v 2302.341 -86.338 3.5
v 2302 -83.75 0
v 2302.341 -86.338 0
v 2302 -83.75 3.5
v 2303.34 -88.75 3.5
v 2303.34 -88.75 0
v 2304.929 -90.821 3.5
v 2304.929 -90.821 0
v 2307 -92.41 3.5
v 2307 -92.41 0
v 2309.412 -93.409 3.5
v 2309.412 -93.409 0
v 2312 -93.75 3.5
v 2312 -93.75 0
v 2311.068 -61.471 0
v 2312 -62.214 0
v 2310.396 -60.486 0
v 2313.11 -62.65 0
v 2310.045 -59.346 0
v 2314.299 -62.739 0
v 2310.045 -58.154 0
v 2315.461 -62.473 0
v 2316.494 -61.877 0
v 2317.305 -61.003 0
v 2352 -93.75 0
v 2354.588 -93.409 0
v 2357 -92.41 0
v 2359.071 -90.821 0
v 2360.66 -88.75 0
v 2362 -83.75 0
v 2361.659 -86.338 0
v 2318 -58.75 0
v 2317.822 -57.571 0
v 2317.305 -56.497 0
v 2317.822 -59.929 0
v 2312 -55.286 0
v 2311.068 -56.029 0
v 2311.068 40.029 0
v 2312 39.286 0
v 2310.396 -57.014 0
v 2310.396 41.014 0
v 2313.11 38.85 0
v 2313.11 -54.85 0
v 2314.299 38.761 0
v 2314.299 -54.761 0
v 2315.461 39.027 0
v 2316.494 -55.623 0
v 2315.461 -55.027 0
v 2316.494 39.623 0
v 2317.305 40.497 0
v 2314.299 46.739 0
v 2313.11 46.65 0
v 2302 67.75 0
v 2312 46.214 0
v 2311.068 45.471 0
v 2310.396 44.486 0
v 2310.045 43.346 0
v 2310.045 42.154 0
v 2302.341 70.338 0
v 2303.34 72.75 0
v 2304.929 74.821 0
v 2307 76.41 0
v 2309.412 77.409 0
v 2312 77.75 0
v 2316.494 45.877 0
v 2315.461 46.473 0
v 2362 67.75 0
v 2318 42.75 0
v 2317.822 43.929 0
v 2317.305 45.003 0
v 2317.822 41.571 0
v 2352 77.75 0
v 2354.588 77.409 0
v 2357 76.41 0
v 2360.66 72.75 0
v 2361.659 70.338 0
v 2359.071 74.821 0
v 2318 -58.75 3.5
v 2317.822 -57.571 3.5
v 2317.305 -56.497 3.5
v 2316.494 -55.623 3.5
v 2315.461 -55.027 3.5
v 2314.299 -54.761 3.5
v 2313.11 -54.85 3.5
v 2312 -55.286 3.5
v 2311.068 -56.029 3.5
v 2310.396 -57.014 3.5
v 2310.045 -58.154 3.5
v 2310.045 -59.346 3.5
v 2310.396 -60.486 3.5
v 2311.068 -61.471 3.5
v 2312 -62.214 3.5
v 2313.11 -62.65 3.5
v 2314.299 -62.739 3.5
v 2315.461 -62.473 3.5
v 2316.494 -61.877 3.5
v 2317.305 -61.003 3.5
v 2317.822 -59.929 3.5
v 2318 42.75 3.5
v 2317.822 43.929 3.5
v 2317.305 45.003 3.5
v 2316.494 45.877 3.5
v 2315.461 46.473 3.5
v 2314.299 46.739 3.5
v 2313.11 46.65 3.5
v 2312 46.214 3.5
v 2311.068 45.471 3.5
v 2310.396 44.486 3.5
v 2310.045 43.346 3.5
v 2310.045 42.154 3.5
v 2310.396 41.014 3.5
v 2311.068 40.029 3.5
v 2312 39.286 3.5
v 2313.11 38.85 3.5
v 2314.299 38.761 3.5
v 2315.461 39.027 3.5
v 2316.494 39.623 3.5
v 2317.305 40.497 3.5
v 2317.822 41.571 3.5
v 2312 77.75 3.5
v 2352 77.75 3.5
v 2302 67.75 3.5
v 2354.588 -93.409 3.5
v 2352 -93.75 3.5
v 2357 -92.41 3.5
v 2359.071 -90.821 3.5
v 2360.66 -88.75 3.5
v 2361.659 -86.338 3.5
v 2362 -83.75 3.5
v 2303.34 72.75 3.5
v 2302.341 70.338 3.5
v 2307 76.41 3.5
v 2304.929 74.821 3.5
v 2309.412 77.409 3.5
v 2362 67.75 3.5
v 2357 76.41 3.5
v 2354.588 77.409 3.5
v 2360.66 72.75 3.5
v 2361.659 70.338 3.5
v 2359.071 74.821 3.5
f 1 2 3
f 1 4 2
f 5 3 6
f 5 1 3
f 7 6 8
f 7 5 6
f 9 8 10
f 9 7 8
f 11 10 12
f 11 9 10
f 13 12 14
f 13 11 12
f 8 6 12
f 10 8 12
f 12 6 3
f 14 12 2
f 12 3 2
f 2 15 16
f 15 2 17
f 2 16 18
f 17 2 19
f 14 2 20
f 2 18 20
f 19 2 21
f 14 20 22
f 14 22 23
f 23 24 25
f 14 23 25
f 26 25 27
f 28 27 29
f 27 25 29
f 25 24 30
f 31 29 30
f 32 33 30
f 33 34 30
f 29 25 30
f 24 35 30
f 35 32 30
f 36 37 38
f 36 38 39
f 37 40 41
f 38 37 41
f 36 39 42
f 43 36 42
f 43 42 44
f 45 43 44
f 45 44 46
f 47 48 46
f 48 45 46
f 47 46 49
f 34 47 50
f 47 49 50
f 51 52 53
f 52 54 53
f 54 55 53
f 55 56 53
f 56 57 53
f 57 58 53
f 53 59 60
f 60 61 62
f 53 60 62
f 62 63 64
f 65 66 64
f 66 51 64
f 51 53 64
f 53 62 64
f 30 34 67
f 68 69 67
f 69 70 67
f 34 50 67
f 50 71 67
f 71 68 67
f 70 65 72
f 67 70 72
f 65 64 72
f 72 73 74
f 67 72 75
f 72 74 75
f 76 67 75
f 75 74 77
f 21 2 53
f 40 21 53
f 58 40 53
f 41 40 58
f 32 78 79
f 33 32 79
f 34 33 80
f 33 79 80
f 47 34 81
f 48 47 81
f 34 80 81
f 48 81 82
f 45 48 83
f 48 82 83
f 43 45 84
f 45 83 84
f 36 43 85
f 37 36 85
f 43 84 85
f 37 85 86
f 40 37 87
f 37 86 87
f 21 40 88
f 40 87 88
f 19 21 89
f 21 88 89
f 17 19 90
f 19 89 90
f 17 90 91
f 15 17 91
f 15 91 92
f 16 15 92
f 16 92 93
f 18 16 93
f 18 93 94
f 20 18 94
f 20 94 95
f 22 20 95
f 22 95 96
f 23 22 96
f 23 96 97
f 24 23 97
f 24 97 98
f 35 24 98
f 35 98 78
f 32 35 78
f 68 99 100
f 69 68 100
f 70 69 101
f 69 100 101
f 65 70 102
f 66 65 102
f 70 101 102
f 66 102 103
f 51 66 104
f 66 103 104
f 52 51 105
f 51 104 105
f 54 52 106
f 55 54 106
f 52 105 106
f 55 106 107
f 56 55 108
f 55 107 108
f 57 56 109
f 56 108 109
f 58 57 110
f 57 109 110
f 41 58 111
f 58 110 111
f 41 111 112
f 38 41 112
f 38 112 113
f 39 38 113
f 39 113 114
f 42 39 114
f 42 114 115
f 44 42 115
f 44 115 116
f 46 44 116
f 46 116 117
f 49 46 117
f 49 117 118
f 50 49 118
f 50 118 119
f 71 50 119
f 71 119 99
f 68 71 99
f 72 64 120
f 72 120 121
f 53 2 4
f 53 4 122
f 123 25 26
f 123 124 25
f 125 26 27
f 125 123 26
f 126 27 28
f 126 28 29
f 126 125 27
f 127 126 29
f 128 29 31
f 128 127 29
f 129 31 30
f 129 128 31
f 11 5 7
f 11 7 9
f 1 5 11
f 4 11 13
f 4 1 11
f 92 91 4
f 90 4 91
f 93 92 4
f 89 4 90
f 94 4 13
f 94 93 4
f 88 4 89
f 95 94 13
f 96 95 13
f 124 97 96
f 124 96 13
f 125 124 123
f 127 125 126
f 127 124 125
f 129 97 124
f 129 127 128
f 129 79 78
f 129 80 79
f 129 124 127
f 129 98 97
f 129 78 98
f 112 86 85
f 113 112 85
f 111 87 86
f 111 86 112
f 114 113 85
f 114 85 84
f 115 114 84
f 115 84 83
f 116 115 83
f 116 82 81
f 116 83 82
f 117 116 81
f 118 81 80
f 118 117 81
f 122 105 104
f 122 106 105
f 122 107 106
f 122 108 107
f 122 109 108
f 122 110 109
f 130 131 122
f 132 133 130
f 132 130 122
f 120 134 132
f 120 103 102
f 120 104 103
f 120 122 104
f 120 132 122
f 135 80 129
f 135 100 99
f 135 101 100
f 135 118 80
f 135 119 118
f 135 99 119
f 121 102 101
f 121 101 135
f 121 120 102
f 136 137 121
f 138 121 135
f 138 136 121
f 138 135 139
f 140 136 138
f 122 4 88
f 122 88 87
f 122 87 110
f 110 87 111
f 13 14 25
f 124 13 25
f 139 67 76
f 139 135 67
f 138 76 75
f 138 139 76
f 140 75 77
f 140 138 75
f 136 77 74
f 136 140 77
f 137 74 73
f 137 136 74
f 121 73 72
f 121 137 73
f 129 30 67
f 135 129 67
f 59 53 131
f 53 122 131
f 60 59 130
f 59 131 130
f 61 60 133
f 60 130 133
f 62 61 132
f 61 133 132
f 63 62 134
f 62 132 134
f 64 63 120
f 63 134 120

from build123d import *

# Parameters (mm, degrees)
SKETCH_1_W          = 60
SKETCH_1_H          = 171.5
EXTRUDE_1_DEPTH     = 3.5
FILLET_1_R          = 10
CUT_EXTRUDE_1_REACH = 5.5
SKETCH_2_R          = 4


with BuildPart() as part:
    # 草图1 → 凸台-拉伸1 (new body)
    with BuildSketch(Plane.XY):
        with Locations((2332, -8)):
            Rectangle(SKETCH_1_W, SKETCH_1_H)
    extrude(amount=EXTRUDE_1_DEPTH)

    # 圆角1
    fillet_1_edges = [part.edges().sort_by_distance(p)[0] for p in [
        (2302, -93.75, 1.75),
        (2302, 77.75, 1.75),
        (2362, 77.75, 1.75),
        (2362, -93.75, 1.75),
    ]]
    fillet(fillet_1_edges, radius=FILLET_1_R)

    # 草图2 → 切除-拉伸1 (cut, up to next)
    with BuildSketch(Plane.XY.offset(3.5), mode=Mode.PRIVATE) as cut_extrude_1_sk1:
        with Locations((2314, 42.75)):
            Circle(SKETCH_2_R)
    cut_extrude_1_tool1 = extrude(cut_extrude_1_sk1.sketch, amount=-CUT_EXTRUDE_1_REACH, mode=Mode.PRIVATE) & part.part
    add(cut_extrude_1_tool1.solids().sort_by_distance((2314, 42.75, 3.5))[0], mode=Mode.SUBTRACT)
    # 草图2 → 切除-拉伸1 (cut, up to next)
    with BuildSketch(Plane.XY.offset(3.5), mode=Mode.PRIVATE) as cut_extrude_1_sk2:
        with Locations((2314, -58.75)):
            Circle(SKETCH_2_R)
    cut_extrude_1_tool2 = extrude(cut_extrude_1_sk2.sketch, amount=-CUT_EXTRUDE_1_REACH, mode=Mode.PRIVATE) & part.part
    add(cut_extrude_1_tool2.solids().sort_by_distance((2314, -58.75, 3.5))[0], mode=Mode.SUBTRACT)


solid = part.part
